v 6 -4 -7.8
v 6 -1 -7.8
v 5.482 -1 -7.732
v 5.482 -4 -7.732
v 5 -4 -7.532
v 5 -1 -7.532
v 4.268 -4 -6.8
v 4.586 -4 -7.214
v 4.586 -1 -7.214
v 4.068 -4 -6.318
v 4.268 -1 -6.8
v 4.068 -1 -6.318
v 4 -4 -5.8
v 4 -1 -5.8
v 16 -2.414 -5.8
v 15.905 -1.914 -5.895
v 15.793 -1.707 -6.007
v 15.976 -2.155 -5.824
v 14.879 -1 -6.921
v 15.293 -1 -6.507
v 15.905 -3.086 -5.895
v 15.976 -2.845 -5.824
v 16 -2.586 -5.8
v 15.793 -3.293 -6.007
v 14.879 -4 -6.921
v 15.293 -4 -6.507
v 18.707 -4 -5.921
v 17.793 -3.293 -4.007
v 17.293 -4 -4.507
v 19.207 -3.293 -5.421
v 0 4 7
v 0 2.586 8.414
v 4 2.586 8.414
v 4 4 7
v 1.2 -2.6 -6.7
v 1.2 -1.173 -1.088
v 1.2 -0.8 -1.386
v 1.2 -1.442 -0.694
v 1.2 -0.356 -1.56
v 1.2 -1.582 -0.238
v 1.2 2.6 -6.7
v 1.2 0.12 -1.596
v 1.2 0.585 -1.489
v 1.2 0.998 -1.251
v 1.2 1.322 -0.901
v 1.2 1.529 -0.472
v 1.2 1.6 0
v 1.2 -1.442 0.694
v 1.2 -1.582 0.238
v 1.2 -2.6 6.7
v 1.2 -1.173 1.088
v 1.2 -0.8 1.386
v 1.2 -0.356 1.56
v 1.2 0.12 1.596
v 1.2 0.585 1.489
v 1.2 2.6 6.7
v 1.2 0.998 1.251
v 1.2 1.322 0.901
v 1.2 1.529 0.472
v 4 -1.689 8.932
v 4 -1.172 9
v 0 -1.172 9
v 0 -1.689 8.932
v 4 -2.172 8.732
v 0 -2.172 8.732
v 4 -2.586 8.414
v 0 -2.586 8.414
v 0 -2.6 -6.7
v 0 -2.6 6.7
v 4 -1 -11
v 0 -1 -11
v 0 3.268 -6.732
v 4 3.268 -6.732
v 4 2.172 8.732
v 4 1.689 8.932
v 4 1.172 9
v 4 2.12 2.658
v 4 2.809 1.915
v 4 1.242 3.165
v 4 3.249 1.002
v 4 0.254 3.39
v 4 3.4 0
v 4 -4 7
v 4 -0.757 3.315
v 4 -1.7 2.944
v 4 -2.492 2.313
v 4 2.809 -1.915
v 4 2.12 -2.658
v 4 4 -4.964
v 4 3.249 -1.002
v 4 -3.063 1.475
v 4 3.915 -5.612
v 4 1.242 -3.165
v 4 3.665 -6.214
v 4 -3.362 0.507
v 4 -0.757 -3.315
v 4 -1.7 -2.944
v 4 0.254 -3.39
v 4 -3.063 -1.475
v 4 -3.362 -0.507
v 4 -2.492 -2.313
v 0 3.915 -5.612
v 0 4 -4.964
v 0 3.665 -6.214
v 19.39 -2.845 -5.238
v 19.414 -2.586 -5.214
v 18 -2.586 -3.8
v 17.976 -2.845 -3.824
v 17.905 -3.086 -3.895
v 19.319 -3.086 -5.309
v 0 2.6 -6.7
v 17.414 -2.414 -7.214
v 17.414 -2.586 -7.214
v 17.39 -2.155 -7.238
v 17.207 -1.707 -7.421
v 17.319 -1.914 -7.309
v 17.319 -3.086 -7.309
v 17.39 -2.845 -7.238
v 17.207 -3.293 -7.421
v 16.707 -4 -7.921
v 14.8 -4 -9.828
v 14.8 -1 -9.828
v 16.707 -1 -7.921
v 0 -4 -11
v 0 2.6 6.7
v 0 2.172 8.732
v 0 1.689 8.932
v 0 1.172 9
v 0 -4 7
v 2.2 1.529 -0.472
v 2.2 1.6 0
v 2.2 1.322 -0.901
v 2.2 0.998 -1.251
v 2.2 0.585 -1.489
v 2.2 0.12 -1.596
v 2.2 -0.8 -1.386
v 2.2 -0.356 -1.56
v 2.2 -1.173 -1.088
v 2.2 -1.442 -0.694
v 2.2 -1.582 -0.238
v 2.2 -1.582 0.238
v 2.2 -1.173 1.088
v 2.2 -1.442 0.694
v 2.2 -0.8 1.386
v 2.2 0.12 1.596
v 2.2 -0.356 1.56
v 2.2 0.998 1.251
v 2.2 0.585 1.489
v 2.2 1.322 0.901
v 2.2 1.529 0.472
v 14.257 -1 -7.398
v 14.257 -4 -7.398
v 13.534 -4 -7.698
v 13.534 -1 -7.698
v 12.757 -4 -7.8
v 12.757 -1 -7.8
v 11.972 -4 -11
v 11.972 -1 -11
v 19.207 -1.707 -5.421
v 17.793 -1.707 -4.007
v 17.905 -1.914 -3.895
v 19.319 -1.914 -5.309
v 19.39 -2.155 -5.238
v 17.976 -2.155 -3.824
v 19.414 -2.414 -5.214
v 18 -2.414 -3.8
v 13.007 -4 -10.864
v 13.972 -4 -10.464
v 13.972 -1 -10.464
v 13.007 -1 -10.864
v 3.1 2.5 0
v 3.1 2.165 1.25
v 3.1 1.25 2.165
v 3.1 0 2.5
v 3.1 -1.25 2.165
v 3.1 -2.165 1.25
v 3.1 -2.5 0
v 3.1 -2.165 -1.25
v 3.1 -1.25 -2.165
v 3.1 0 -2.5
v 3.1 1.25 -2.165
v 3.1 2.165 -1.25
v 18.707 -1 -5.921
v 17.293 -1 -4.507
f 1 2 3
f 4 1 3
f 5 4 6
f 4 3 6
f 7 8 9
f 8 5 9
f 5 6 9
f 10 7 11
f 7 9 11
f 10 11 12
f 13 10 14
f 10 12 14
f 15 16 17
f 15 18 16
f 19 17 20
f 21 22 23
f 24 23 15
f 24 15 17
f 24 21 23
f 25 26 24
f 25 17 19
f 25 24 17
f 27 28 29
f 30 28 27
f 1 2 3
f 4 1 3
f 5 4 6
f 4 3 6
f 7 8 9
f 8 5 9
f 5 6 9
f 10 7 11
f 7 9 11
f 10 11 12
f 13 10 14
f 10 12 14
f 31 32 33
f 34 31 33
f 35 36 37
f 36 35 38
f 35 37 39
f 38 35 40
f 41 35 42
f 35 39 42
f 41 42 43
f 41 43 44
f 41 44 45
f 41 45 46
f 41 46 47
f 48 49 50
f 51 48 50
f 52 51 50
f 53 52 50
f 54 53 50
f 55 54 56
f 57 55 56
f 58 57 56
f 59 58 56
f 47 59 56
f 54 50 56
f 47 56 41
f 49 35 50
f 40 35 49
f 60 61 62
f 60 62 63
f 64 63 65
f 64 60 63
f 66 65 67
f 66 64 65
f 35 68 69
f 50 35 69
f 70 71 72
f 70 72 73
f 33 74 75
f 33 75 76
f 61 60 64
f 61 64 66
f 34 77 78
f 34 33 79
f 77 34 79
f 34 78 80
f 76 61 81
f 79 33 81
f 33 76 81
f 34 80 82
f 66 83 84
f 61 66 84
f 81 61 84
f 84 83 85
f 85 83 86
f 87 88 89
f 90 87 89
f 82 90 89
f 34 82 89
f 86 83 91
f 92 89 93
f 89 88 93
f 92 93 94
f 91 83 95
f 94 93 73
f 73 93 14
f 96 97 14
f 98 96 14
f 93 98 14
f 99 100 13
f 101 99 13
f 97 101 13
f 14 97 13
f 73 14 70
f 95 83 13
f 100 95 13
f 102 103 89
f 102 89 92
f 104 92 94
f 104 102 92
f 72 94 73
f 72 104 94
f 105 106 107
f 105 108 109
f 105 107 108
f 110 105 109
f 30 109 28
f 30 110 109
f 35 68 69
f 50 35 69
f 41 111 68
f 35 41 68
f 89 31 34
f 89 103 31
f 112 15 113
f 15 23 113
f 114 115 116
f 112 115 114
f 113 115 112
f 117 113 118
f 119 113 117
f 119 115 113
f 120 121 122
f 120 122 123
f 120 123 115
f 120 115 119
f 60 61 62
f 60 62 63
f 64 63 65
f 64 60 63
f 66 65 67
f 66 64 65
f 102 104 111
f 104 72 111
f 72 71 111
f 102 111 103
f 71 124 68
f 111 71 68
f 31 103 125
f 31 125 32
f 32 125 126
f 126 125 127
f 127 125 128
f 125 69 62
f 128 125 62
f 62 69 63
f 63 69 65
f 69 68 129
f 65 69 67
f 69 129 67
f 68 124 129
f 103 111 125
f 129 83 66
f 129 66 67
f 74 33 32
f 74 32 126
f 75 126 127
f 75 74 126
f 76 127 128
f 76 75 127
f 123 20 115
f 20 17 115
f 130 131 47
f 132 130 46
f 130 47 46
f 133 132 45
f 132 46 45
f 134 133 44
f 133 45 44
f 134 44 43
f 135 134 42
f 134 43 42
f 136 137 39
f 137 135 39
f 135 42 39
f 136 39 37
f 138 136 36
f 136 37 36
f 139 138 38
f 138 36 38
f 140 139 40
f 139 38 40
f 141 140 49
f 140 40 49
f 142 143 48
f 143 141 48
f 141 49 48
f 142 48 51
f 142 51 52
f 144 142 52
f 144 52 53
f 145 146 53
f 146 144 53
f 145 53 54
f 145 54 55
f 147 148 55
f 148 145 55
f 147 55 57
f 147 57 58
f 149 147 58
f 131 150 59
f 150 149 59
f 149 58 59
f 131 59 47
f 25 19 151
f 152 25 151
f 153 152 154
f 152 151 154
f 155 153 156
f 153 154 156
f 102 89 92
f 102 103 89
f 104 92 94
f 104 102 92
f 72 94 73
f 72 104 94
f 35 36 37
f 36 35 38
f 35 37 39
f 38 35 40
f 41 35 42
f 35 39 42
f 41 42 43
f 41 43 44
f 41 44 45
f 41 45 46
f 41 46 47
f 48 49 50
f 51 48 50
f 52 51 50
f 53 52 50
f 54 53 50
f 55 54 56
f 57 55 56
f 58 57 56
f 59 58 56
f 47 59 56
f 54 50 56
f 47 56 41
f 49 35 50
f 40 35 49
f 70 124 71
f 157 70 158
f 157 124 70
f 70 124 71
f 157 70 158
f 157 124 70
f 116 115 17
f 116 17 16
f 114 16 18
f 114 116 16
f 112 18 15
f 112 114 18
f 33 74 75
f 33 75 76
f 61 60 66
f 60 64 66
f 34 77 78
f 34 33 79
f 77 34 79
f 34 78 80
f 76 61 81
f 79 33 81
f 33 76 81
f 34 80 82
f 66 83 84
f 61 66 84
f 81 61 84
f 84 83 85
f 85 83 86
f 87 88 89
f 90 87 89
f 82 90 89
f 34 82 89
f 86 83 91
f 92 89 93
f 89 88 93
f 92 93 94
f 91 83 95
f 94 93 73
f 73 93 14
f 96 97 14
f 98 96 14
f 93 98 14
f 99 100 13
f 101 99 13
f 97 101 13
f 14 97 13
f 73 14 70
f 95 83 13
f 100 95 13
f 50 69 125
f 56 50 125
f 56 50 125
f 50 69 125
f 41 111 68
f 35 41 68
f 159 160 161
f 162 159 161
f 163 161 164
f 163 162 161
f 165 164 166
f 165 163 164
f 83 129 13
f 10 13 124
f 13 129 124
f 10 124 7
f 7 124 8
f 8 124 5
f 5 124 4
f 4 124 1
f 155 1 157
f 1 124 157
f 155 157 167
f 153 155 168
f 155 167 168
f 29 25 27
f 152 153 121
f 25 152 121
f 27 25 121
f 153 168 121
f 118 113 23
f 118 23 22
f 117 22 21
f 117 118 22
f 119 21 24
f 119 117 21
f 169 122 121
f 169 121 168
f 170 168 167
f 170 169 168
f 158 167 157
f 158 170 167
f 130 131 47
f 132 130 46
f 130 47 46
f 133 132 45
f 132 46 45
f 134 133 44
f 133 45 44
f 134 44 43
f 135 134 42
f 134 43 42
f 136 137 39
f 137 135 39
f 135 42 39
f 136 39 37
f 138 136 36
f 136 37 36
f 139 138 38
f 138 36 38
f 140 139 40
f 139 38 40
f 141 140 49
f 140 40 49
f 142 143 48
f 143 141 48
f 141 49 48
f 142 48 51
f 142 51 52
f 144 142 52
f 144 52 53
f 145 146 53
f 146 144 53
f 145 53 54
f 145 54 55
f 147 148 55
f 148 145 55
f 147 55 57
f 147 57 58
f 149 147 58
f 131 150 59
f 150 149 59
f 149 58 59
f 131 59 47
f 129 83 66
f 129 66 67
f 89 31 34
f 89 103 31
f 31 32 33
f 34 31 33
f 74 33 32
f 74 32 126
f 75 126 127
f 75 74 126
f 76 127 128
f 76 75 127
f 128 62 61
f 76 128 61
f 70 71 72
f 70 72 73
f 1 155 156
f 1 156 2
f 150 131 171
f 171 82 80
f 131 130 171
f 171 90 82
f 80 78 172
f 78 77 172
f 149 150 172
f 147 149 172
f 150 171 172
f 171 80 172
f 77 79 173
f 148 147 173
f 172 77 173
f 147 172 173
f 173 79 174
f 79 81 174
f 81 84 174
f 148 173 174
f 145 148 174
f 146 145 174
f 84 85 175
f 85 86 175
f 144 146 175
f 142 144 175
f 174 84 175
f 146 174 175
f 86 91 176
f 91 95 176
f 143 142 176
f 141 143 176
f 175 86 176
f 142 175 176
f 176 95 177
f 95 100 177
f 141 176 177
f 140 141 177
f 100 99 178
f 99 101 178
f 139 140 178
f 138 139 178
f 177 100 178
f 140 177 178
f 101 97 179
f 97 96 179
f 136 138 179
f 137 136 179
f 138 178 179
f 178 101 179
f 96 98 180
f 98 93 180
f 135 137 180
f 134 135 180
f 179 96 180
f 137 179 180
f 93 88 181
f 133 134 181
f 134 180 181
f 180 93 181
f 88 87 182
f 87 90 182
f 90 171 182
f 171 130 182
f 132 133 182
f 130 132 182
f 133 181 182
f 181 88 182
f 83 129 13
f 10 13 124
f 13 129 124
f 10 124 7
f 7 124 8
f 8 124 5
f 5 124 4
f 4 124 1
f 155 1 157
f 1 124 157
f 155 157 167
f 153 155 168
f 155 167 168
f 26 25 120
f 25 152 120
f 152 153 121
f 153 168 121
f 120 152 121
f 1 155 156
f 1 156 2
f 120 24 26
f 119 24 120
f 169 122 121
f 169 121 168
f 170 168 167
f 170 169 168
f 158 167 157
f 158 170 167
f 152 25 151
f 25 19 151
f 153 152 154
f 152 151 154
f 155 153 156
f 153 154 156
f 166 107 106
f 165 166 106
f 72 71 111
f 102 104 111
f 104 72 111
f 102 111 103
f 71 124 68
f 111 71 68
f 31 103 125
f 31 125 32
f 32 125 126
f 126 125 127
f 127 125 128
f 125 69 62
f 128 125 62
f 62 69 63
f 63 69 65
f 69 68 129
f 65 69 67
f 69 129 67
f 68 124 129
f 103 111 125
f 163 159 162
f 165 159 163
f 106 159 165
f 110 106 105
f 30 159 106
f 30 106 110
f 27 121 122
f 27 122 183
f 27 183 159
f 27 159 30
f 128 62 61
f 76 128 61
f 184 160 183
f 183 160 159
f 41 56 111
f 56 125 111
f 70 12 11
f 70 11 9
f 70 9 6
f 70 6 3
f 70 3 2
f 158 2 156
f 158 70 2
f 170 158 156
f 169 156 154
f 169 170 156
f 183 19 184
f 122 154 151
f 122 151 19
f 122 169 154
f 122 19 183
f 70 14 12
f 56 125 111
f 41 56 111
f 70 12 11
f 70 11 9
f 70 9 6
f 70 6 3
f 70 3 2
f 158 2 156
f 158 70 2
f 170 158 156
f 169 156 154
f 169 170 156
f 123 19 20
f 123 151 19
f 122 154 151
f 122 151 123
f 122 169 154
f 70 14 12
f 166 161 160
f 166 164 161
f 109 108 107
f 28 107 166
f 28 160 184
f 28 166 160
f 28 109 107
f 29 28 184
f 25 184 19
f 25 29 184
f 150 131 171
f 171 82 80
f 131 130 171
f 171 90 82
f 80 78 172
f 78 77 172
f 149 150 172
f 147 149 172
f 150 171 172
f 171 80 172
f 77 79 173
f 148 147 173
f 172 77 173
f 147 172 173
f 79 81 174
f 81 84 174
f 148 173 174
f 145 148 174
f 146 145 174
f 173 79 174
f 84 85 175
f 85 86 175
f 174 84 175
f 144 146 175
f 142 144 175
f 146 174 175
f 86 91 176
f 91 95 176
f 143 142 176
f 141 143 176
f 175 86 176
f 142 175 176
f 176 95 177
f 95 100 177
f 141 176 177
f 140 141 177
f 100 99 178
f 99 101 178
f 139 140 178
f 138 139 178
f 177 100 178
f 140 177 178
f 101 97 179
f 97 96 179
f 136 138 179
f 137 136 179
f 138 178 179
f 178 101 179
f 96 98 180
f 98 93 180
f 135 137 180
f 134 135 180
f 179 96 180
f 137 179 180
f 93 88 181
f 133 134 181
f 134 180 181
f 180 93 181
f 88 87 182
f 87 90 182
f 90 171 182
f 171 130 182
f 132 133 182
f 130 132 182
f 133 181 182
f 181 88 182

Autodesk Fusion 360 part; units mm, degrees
sketch "SlotLayout" plane through (0, 0, 0) normal (1, 0, 0) x (0, 1, 0)
  line L0 (-22.4, 25) -> (-22.4, 15)
  line L1 (82.4, 5) -> (82.4, -5)
  line L2 (-37.6, -5) -> (-37.6, 5)
  line L3 (-80, 5) -> (-80, -5) construction
  line L4 (-97.6, 15) -> (-97.6, 25)
  line L5 (2.4, -5) -> (2.4, 5)
  arc A0 (-77.6, 5) -> (-82.4, 5) centre (-80, 5) ccw
  arc A1 (22.4, 25) -> (17.6, 25) centre (20, 25) ccw
  arc A2 (-97.6, 25) -> (-102.4, 25) centre (-100, 25) ccw
  arc A3 (97.6, 15) -> (102.4, 15) centre (100, 15) ccw
  line L6 (-60, 25) -> (-60, 15) construction
  line L7 (-77.6, -5) -> (-77.6, 5)
  arc A4 (77.6, -5) -> (82.4, -5) centre (80, -5) ccw
  line L8 (-40, 5) -> (-40, -5) construction
  line L9 (-57.6, 15) -> (-57.6, 25)
  line L10 (-62.4, 25) -> (-62.4, 15)
  line L11 (-102.4, 25) -> (-102.4, 15)
  line L12 (97.6, 15) -> (97.6, 25)
  arc A5 (-102.4, 15) -> (-97.6, 15) centre (-100, 15) ccw
  line L13 (20, 25) -> (20, 15) construction
  line L14 (22.4, 25) -> (22.4, 15)
  line L15 (-80, 0) -> (0, 0) construction
  line L16 (62.4, 25) -> (62.4, 15)
  line L17 (42.4, 5) -> (42.4, -5)
  arc A6 (2.5, 5) -> (-2.5, 5) centre (0, 5) ccw
  arc A7 (2.4, 5) -> (-2.4, 5) centre (0, 5) ccw
  line L18 (80, 5) -> (80, -5) construction
  arc A8 (82.4, 5) -> (77.6, 5) centre (80, 5) ccw
  arc A9 (-2.5, -5) -> (2.5, -5) centre (0, -5) ccw
  arc A10 (57.6, 15) -> (62.4, 15) centre (60, 15) ccw
  arc A11 (62.4, 25) -> (57.6, 25) centre (60, 25) ccw
  line L19 (17.6, 15) -> (17.6, 25)
  line L20 (-20, 25) -> (-20, 15) construction
  line L21 (-42.4, 5) -> (-42.4, -5)
  line L22 (60, 25) -> (60, 15) construction
  arc A12 (42.4, 5) -> (37.6, 5) centre (40, 5) ccw
  line L23 (-100, 25) -> (-100, 15) construction
  line L24 (100, 25) -> (100, 15) construction
  arc A13 (-57.6, 25) -> (-62.4, 25) centre (-60, 25) ccw
  arc A14 (37.6, -5) -> (42.4, -5) centre (40, -5) ccw
  line L25 (40, 5) -> (40, -5) construction
  line L26 (-17.6, 15) -> (-17.6, 25)
  arc A15 (-17.6, 25) -> (-22.4, 25) centre (-20, 25) ccw
  line L27 (-82.4, 5) -> (-82.4, -5)
  line L28 (-2.5, 5) -> (-2.5, -5)
  line L29 (-2.4, 5) -> (-2.4, -5)
  line L30 (102.4, 25) -> (102.4, 15)
  arc A16 (17.6, 15) -> (22.4, 15) centre (20, 15) ccw
  arc A17 (-22.4, 15) -> (-17.6, 15) centre (-20, 15) ccw
  line L31 (37.6, -5) -> (37.6, 5)
  line L32 (0, 5) -> (0, -5) construction
  arc A18 (-62.4, 15) -> (-57.6, 15) centre (-60, 15) ccw
  arc A19 (-42.4, -5) -> (-37.6, -5) centre (-40, -5) ccw
  arc A20 (-2.4, -5) -> (2.4, -5) centre (0, -5) ccw
  arc A21 (102.4, 25) -> (97.6, 25) centre (100, 25) ccw
  arc A22 (-82.4, -5) -> (-77.6, -5) centre (-80, -5) ccw
  arc A23 (-37.6, 5) -> (-42.4, 5) centre (-40, 5) ccw
  line L33 (77.6, -5) -> (77.6, 5)
  line L34 (57.6, 15) -> (57.6, 25)
  line L35 (2.5, -5) -> (2.5, 5)
  point P0 (-20, 20)
  point P1 (-40, 0)
  dimension "d9" = -40
  dimension "d10" = 0
  dimension "d255" = 0.1
  dimension "d22" = 10
  dimension "d23" = 2.4
  dimension "d4" = 40
  dimension "d25" = 40
  dimension "d26" = 20
  dimension "d27" = 20
sketch "VerticalPrintKey" plane through (0, 0, 0) normal (1, 0, 0) x (0, 1, 0)
  line L0 (-2.6, 6.7) -> (2.6, 6.7)
  line L1 (2.6, 6.7) -> (2.6, -6.7)
  line L2 (2.6, -6.7) -> (-2.6, -6.7)
  line L3 (-2.6, -6.7) -> (-2.6, 6.7)
  line L4 (0, 6.7) -> (0, -6.7) construction
  circle A0 centre (0, 0) radius 1.6
  line L5 (2.6, 0) -> (20.8722, 0) construction
  line L6 (20.8722, 0) -> (11.7361, 9.1361) construction
  line L7 (11.7361, 9.1361) -> (11.7361, -9.1361) construction
  line L8 (11.7361, -9.1361) -> (20.8722, 0) construction
  dimension "d18" = 13.4
  dimension "d19" = 5.2
  dimension "d20" = 3.2
sketch "HorizontalPrintKey" plane through (0, 0, 0) normal (1, 0, 0) x (0, 1, 0)
  circle A0 centre (0, 0) radius 1.6
  line L0 (2.6, -6.7) -> (-2.6, -6.7)
  line L1 (-2.6, -6.7) -> (-2.6, 6.7)
  line L2 (-2.6, 6.7) -> (2.6, 6.7)
  line L3 (2.6, 6.7) -> (2.6, -6.7)
  line L4 (0, 6.7) -> (0, -6.7) construction
  line L5 (0, 6.7) -> (0, 23.5939) construction
  line L6 (0, 23.5939) -> (-8.4469, 15.1469) construction
  line L7 (-8.4469, 15.1469) -> (8.4469, 15.1469) construction
  line L8 (8.4469, 15.1469) -> (0, 23.5939) construction
  dimension "d21" = 13.4
  dimension "d24" = 5.2
  dimension "d28" = 3.2
sketch "BaseProfile" plane through (0, 0, 0) normal (0, 1, 0) x (1, 0, 0) in component "SNS_NarrowHook_W_D_02"
  line L0 (13.6284, 11) -> (17.4142, 7.2142)
  line L1 (4, -9) -> (4, 11)
  line L2 (14, 7.8) -> (15.4142, 9.2142) construction
  line L3 (0, 11) -> (0, -9)
  line L4 (4, 11) -> (0, 11)
  line L5 (16, 5.8) -> (17.4142, 7.2142)
  line L6 (0, -9) -> (4, -9)
  line L7 (14, 7.8) -> (4, 7.8)
  line L8 (4, 11) -> (13.6284, 11)
  line L9 (16, 5.8) -> (14, 7.8)
  line L10 (4, 0) -> (0, 0) construction
  dimension "d14" = 135
  dimension "d16" = 2
  dimension "d17" = 3.2
  dimension "d33" = 4
  dimension "d229" = 10
  dimension "d231" = 9
  dimension "d232" = 20
  dimension "d38" = 2
extrude "Extrude1" add sketch "BaseProfile" along normal mid plane 8 contours L1 L3 L4 L6 makes body 1 in component "SNS_NarrowHook_W_D_02"
extrude "Extrude2" cut sketch "VerticalPrintKey" along normal blind 1.2 contours L0 L1 L2 L3 | A0 bodies 1 in component "SNS_NarrowHook_W_D_02"
extrude "Extrude3" cut sketch "VerticalPrintKey" along normal up to surface (4 mm away) contours A0 bodies 1 in component "SNS_NarrowHook_W_D_02"
extrude "Extrude4" add sketch "BaseProfile" along normal blind 3 from surface at -4 contours L0 L1 L5 L7 L8 L9 bodies 1 in component "SNS_NarrowHook_W_D_02"
chamfer "Chamfer1" distance 1.8 angle 45 1 edges at (4, -1.4917, 0.5786) on bodies 1 in component "SNS_NarrowHook_W_D_02"
chamfer "Chamfer2" distance 2 angle 45 2 edges at (2, 4, 9) (2, -4, 9) on bodies 1 in component "SNS_NarrowHook_W_D_02"
chamfer "Chamfer2" distance 1 angle 45 2 edges at (16.7071, -4, -6.5071) (16.7071, -1, -6.5071) on bodies 1 in component "SNS_NarrowHook_W_D_02"
fillet "Fillet1" radius 2 2 edges at (2, 2, 9) (2, -2, 9) on bodies 1 in component "SNS_NarrowHook_W_D_02"
fillet "Fillet1" radius 2 1 edges at (4, -2.5, -7.8) on bodies 1 in component "SNS_NarrowHook_W_D_02"
fillet "Fillet1" radius 3 1 edges at (14, -2.5, -7.8) on bodies 1 in component "SNS_NarrowHook_W_D_02"
fillet "Fillet1" radius 4 1 edges at (13.6284, -2.5, -11) on bodies 1 in component "SNS_NarrowHook_W_D_02"
fillet "Fillet1" radius 1 2 edges at (16.7071, -3, -6.5071) (16.7071, -2, -6.5071) on bodies 1 in component "SNS_NarrowHook_W_D_02"
chamfer "Chamfer3" distance 5 angle 45 1 edges at (2, 4, -11) on bodies 1 in component "SNS_NarrowHook_W_D_02"
fillet "Fillet2" radius 2.5 1 edges at (2, 4, -6) on bodies 1 in component "SNS_NarrowHook_W_D_02"
sketch "BaseProfile (2)" plane through (0, 0, 0) normal (0, 1, 0) x (1, 0, 0) in component "SNS_NarrowHook_W_D_04"
  line L0 (13.6284, 11) -> (19.4142, 5.2142)
  line L1 (4, -9) -> (4, 11)
  line L2 (14, 7.8) -> (15.4142, 9.2142) construction
  line L3 (0, 11) -> (0, -9)
  line L4 (4, 11) -> (0, 11)
  line L5 (18, 3.8) -> (19.4142, 5.2142)
  line L6 (0, -9) -> (4, -9)
  line L7 (14, 7.8) -> (4, 7.8)
  line L8 (4, 11) -> (13.6284, 11)
  line L9 (18, 3.8) -> (14, 7.8)
  line L10 (4, 0) -> (0, 0) construction
  dimension "d14_1" = 135
  dimension "d16_1" = 2
  dimension "d17_1" = 3.2
  dimension "d33_1" = 4
  dimension "d229_1" = 10
  dimension "d231_1" = 9
  dimension "d232_1" = 20
  dimension "d38_1" = 4
extrude "Extrude1'" add sketch "BaseProfile (2)" along normal mid plane 8 separate body contours L1 L3 L4 L6 makes body 2 in component "SNS_NarrowHook_W_D_04"
extrude "Extrude2'" cut sketch "VerticalPrintKey" along normal blind 1.2 contours L0 L1 L2 L3 | A0 bodies 2 in component "SNS_NarrowHook_W_D_04"
extrude "Extrude3'" cut sketch "VerticalPrintKey" along normal up to surface (4 mm away) contours A0 bodies 2 in component "SNS_NarrowHook_W_D_04"
extrude "Extrude4'" add sketch "BaseProfile (2)" along normal blind 3 from surface at -4 contours L0 L1 L5 L7 L8 L9 bodies 2 in component "SNS_NarrowHook_W_D_04"
chamfer "Chamfer1'" distance 1.8 angle 45 1 edges at (4, -1.4917, 0.5786) on bodies 2 in component "SNS_NarrowHook_W_D_04"
chamfer "Chamfer2'" distance 2 angle 45 2 edges at (2, 4, 9) (2, -4, 9) on bodies 2 in component "SNS_NarrowHook_W_D_04"
chamfer "Chamfer2'" distance 1 angle 45 2 edges at (18.7071, -4, -4.5071) (18.7071, -1, -4.5071) on bodies 2 in component "SNS_NarrowHook_W_D_04"
fillet "Fillet1'" radius 2 2 edges at (2, 2, 9) (2, -2, 9) on bodies 2 in component "SNS_NarrowHook_W_D_04"
fillet "Fillet1'" radius 2 1 edges at (4, -2.5, -7.8) on bodies 2 in component "SNS_NarrowHook_W_D_04"
fillet "Fillet1'" radius 3 1 edges at (14, -2.5, -7.8) on bodies 2 in component "SNS_NarrowHook_W_D_04"
fillet "Fillet1'" radius 4 1 edges at (13.6284, -2.5, -11) on bodies 2 in component "SNS_NarrowHook_W_D_04"
fillet "Fillet1'" radius 1 2 edges at (18.7071, -3, -4.5071) (18.7071, -2, -4.5071) on bodies 2 in component "SNS_NarrowHook_W_D_04"
chamfer "Chamfer3'" distance 5 angle 45 1 edges at (2, 4, -11) on bodies 2 in component "SNS_NarrowHook_W_D_04"
fillet "Fillet2'" radius 2.5 1 edges at (2, 4, -6) on bodies 2 in component "SNS_NarrowHook_W_D_04"
component "SNS_NarrowHook_W_D_02" placed x (1, 0, 0) y (0, 1, 0) z (0, 0, 1) at (0, 0, 0)
component "SNS_NarrowHook_W_D_04" placed x (1, 0, 0) y (0, 1, 0) z (0, 0, 1) at (0, 0, 0)
equation "XY_Tolerance = 0.2 mm"
equation "Z_Tolerance = 0.2 mm"
equation "Wall_Thickness = 0.4 mm"
equation "Layer_Height = 0.2 mm"
equation "M3Hole_wClearance = 3.2 mm"
equation "M3Hole_wSelfTapping = 2.8 mm"
equation "d20 = M3Hole_wClearance"
equation "d28 = M3Hole_wClearance"
equation "M3Hole_CounterSink = 1.8 mm"
equation "d16 = d15"
equation "d17 = Wall_Thickness * 8"
equation "d229 = HookDepth"
equation "d230 = LipHeight"
equation "d45 = M3Hole_CounterSink"
equation "d50 = HookWidth"
equation "d61 = SideChamfer"
equation "HookWidth = 3 mm" comment "Muste be between 3 and 8"
equation "HookDepth = 10 mm"
equation "SideChamfer = 8 mm - HookWidth"
equation "d66 = SideChamfer / 2"
equation "d16_1 = d15"
equation "d17_1 = Wall_Thickness * 8"
equation "d229_1 = HookDepth"
equation "d45_1 = M3Hole_CounterSink"
equation "d50_1 = HookWidth"
equation "d61_1 = SideChamfer"
equation "d66_1 = SideChamfer / 2"
